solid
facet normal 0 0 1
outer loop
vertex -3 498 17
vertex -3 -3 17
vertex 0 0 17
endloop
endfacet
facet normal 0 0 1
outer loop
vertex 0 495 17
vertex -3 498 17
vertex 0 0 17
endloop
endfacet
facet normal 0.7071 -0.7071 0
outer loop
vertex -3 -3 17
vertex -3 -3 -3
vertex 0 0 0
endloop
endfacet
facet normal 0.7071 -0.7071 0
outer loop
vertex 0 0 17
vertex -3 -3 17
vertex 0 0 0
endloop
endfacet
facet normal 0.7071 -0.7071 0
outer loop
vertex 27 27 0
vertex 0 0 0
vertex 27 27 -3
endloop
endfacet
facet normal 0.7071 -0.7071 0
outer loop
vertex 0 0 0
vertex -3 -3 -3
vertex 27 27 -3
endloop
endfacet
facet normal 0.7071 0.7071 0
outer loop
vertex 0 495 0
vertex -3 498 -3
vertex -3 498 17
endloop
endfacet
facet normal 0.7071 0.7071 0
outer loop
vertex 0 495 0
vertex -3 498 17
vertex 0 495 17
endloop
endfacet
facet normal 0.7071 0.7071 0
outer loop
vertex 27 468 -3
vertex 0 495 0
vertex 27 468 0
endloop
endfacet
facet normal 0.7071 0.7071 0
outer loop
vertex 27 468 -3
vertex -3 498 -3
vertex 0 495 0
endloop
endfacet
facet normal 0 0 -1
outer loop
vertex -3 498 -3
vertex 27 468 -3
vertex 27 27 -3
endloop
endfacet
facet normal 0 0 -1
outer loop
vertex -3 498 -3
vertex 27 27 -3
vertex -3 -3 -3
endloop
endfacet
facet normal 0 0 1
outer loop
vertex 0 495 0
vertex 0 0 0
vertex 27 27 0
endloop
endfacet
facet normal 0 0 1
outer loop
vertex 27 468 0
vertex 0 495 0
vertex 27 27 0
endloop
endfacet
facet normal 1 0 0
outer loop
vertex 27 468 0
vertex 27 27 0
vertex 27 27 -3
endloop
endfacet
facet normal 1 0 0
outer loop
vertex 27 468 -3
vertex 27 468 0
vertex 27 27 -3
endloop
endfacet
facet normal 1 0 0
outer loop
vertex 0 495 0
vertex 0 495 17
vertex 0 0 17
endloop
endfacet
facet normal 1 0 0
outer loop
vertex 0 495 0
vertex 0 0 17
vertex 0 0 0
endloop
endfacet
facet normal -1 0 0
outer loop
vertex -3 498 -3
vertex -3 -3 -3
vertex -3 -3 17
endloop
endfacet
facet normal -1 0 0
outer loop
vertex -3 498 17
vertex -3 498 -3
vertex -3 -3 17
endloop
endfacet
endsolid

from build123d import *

# Parameters (mm, degrees)
BOX023_W               = 100
BOX023_H               = 100
BOX023_DEPTH           = 30
BOX023_PLACEMENT_ANGLE = -45
BOX022_W               = 30
BOX022_H               = 100
BOX022_DEPTH           = 30
BOX022_PLACEMENT_ANGLE = -45
PAD001_DEPTH           = 501


with BuildPart() as cube008:
    # Box023 → Box023 (new body)
    with BuildSketch(Plane.XY):
        with Locations((50, 50)):
            Rectangle(BOX023_W, BOX023_H)
    extrude(amount=BOX023_DEPTH)


with BuildPart() as cube008_1:
    # Box023 placement: moved
    add(cube008.part.moved(Location((-3, 498, -3))).rotate(Axis((-3, 498, -3), (0, 0, 1)), BOX023_PLACEMENT_ANGLE))


with BuildPart() as cube007:
    # Box022 → Box022 (new body)
    with BuildSketch(Plane.XY):
        with Locations((15, 50)):
            Rectangle(BOX022_W, BOX022_H)
    extrude(amount=BOX022_DEPTH)


with BuildPart() as cube007_1:
    # Box022 placement: moved
    add(cube007.part.moved(Location((-3, -3, -3))).rotate(Axis((-3, -3, -3), (0, 0, 1)), BOX022_PLACEMENT_ANGLE))


with BuildPart() as rahmen3:
    # Sketch001 → Pad001 (new body)
    with BuildSketch(Plane.XZ.offset(3)):
        Polygon((0, 17), (0, 0), (27, 0), (27, -3), (-3, -3), (-3, 17), align=None)
    extrude(amount=-PAD001_DEPTH)

    # Cut003: cut Cube007
    add(cube007_1.part, mode=Mode.SUBTRACT)

    # Cut004: cut Cube008
    add(cube008_1.part, mode=Mode.SUBTRACT)


solid = rahmen3.part
